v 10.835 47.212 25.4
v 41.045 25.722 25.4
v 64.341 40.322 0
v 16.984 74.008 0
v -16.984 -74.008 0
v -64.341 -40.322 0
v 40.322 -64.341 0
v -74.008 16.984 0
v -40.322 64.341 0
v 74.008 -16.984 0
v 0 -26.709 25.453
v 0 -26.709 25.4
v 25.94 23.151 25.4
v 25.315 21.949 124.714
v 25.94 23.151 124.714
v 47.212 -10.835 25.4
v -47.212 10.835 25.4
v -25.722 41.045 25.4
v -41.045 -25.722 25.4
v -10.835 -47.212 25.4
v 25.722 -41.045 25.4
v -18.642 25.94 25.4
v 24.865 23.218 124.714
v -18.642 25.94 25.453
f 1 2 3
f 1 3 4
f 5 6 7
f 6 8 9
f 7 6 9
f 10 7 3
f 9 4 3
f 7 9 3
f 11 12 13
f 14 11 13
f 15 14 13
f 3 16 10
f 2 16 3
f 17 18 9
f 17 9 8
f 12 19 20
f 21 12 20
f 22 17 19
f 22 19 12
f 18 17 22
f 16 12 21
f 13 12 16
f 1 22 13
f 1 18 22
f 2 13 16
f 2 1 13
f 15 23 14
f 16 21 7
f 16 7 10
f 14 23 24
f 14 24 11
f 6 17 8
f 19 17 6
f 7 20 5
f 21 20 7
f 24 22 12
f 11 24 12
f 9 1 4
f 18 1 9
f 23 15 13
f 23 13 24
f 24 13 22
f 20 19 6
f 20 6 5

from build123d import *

# Parameters (mm, degrees)
F1_DEPTH = 25.4
F2_SIZE  = 25.39999
F4_DEPTH = 99.314
F5_SIZE2 = 99.2610316746
F5_SIZE  = 40.10406


# Not quite as in the source:
# - a fillet or chamfer is up to 0.001 mm smaller than in the source, because OpenCascade refuses the exact size


with BuildPart() as f1:
    # F0 (on Top) → F1 (new body)
    with BuildSketch(Plane.XY):
        Polygon((40.3215661799, -64.3411021127), (74.0076824868, -16.984376739), (64.3411021127, 40.3215661799), (16.984376739, 74.0076824868), (-40.3215661799, 64.3411021127), (-74.0076824868, 16.984376739), (-64.3411021127, -40.3215661799), (-16.984376739, -74.0076824868), align=None)
    extrude(amount=F1_DEPTH)

    # F2 (size 25.4 in the source; OpenCascade refuses exactly that, so slightly less here)
    f2_edges = [f1.edges().sort_by_distance(p)[0] for p in [
        (11.668595, -69.174392, 25.4),
        (57.164624, -40.662739, 25.4),
        (69.174392, 11.668595, 25.4),
        (40.662739, 57.164624, 25.4),
        (-11.668595, 69.174392, 25.4),
        (-69.174392, -11.668595, 25.4),
        (-40.662739, -57.164624, 25.4),
        (-57.164624, 40.662739, 25.4),
    ]]
    chamfer(f2_edges, length=F2_SIZE)

    # F3 (on face) → F4 (join)
    with BuildSketch(Plane.XY.offset(25.4)):
        Polygon((-18.6424832791, 25.9398680102), (0, -26.7094988376), (25.9398680102, 23.150825873), align=None)
    extrude(amount=F4_DEPTH)

    # F5
    f5_edges = [f1.edges().sort_by_distance(p)[0] for p in [
        (-9.321242, -0.384815, 124.714),
    ]]
    f5_side = f1.faces().sort_by_distance((2.432462, 7.460398, 124.714))[0]
    chamfer(f5_edges, length=F5_SIZE, length2=F5_SIZE2, reference=f5_side)


solid = f1.part
